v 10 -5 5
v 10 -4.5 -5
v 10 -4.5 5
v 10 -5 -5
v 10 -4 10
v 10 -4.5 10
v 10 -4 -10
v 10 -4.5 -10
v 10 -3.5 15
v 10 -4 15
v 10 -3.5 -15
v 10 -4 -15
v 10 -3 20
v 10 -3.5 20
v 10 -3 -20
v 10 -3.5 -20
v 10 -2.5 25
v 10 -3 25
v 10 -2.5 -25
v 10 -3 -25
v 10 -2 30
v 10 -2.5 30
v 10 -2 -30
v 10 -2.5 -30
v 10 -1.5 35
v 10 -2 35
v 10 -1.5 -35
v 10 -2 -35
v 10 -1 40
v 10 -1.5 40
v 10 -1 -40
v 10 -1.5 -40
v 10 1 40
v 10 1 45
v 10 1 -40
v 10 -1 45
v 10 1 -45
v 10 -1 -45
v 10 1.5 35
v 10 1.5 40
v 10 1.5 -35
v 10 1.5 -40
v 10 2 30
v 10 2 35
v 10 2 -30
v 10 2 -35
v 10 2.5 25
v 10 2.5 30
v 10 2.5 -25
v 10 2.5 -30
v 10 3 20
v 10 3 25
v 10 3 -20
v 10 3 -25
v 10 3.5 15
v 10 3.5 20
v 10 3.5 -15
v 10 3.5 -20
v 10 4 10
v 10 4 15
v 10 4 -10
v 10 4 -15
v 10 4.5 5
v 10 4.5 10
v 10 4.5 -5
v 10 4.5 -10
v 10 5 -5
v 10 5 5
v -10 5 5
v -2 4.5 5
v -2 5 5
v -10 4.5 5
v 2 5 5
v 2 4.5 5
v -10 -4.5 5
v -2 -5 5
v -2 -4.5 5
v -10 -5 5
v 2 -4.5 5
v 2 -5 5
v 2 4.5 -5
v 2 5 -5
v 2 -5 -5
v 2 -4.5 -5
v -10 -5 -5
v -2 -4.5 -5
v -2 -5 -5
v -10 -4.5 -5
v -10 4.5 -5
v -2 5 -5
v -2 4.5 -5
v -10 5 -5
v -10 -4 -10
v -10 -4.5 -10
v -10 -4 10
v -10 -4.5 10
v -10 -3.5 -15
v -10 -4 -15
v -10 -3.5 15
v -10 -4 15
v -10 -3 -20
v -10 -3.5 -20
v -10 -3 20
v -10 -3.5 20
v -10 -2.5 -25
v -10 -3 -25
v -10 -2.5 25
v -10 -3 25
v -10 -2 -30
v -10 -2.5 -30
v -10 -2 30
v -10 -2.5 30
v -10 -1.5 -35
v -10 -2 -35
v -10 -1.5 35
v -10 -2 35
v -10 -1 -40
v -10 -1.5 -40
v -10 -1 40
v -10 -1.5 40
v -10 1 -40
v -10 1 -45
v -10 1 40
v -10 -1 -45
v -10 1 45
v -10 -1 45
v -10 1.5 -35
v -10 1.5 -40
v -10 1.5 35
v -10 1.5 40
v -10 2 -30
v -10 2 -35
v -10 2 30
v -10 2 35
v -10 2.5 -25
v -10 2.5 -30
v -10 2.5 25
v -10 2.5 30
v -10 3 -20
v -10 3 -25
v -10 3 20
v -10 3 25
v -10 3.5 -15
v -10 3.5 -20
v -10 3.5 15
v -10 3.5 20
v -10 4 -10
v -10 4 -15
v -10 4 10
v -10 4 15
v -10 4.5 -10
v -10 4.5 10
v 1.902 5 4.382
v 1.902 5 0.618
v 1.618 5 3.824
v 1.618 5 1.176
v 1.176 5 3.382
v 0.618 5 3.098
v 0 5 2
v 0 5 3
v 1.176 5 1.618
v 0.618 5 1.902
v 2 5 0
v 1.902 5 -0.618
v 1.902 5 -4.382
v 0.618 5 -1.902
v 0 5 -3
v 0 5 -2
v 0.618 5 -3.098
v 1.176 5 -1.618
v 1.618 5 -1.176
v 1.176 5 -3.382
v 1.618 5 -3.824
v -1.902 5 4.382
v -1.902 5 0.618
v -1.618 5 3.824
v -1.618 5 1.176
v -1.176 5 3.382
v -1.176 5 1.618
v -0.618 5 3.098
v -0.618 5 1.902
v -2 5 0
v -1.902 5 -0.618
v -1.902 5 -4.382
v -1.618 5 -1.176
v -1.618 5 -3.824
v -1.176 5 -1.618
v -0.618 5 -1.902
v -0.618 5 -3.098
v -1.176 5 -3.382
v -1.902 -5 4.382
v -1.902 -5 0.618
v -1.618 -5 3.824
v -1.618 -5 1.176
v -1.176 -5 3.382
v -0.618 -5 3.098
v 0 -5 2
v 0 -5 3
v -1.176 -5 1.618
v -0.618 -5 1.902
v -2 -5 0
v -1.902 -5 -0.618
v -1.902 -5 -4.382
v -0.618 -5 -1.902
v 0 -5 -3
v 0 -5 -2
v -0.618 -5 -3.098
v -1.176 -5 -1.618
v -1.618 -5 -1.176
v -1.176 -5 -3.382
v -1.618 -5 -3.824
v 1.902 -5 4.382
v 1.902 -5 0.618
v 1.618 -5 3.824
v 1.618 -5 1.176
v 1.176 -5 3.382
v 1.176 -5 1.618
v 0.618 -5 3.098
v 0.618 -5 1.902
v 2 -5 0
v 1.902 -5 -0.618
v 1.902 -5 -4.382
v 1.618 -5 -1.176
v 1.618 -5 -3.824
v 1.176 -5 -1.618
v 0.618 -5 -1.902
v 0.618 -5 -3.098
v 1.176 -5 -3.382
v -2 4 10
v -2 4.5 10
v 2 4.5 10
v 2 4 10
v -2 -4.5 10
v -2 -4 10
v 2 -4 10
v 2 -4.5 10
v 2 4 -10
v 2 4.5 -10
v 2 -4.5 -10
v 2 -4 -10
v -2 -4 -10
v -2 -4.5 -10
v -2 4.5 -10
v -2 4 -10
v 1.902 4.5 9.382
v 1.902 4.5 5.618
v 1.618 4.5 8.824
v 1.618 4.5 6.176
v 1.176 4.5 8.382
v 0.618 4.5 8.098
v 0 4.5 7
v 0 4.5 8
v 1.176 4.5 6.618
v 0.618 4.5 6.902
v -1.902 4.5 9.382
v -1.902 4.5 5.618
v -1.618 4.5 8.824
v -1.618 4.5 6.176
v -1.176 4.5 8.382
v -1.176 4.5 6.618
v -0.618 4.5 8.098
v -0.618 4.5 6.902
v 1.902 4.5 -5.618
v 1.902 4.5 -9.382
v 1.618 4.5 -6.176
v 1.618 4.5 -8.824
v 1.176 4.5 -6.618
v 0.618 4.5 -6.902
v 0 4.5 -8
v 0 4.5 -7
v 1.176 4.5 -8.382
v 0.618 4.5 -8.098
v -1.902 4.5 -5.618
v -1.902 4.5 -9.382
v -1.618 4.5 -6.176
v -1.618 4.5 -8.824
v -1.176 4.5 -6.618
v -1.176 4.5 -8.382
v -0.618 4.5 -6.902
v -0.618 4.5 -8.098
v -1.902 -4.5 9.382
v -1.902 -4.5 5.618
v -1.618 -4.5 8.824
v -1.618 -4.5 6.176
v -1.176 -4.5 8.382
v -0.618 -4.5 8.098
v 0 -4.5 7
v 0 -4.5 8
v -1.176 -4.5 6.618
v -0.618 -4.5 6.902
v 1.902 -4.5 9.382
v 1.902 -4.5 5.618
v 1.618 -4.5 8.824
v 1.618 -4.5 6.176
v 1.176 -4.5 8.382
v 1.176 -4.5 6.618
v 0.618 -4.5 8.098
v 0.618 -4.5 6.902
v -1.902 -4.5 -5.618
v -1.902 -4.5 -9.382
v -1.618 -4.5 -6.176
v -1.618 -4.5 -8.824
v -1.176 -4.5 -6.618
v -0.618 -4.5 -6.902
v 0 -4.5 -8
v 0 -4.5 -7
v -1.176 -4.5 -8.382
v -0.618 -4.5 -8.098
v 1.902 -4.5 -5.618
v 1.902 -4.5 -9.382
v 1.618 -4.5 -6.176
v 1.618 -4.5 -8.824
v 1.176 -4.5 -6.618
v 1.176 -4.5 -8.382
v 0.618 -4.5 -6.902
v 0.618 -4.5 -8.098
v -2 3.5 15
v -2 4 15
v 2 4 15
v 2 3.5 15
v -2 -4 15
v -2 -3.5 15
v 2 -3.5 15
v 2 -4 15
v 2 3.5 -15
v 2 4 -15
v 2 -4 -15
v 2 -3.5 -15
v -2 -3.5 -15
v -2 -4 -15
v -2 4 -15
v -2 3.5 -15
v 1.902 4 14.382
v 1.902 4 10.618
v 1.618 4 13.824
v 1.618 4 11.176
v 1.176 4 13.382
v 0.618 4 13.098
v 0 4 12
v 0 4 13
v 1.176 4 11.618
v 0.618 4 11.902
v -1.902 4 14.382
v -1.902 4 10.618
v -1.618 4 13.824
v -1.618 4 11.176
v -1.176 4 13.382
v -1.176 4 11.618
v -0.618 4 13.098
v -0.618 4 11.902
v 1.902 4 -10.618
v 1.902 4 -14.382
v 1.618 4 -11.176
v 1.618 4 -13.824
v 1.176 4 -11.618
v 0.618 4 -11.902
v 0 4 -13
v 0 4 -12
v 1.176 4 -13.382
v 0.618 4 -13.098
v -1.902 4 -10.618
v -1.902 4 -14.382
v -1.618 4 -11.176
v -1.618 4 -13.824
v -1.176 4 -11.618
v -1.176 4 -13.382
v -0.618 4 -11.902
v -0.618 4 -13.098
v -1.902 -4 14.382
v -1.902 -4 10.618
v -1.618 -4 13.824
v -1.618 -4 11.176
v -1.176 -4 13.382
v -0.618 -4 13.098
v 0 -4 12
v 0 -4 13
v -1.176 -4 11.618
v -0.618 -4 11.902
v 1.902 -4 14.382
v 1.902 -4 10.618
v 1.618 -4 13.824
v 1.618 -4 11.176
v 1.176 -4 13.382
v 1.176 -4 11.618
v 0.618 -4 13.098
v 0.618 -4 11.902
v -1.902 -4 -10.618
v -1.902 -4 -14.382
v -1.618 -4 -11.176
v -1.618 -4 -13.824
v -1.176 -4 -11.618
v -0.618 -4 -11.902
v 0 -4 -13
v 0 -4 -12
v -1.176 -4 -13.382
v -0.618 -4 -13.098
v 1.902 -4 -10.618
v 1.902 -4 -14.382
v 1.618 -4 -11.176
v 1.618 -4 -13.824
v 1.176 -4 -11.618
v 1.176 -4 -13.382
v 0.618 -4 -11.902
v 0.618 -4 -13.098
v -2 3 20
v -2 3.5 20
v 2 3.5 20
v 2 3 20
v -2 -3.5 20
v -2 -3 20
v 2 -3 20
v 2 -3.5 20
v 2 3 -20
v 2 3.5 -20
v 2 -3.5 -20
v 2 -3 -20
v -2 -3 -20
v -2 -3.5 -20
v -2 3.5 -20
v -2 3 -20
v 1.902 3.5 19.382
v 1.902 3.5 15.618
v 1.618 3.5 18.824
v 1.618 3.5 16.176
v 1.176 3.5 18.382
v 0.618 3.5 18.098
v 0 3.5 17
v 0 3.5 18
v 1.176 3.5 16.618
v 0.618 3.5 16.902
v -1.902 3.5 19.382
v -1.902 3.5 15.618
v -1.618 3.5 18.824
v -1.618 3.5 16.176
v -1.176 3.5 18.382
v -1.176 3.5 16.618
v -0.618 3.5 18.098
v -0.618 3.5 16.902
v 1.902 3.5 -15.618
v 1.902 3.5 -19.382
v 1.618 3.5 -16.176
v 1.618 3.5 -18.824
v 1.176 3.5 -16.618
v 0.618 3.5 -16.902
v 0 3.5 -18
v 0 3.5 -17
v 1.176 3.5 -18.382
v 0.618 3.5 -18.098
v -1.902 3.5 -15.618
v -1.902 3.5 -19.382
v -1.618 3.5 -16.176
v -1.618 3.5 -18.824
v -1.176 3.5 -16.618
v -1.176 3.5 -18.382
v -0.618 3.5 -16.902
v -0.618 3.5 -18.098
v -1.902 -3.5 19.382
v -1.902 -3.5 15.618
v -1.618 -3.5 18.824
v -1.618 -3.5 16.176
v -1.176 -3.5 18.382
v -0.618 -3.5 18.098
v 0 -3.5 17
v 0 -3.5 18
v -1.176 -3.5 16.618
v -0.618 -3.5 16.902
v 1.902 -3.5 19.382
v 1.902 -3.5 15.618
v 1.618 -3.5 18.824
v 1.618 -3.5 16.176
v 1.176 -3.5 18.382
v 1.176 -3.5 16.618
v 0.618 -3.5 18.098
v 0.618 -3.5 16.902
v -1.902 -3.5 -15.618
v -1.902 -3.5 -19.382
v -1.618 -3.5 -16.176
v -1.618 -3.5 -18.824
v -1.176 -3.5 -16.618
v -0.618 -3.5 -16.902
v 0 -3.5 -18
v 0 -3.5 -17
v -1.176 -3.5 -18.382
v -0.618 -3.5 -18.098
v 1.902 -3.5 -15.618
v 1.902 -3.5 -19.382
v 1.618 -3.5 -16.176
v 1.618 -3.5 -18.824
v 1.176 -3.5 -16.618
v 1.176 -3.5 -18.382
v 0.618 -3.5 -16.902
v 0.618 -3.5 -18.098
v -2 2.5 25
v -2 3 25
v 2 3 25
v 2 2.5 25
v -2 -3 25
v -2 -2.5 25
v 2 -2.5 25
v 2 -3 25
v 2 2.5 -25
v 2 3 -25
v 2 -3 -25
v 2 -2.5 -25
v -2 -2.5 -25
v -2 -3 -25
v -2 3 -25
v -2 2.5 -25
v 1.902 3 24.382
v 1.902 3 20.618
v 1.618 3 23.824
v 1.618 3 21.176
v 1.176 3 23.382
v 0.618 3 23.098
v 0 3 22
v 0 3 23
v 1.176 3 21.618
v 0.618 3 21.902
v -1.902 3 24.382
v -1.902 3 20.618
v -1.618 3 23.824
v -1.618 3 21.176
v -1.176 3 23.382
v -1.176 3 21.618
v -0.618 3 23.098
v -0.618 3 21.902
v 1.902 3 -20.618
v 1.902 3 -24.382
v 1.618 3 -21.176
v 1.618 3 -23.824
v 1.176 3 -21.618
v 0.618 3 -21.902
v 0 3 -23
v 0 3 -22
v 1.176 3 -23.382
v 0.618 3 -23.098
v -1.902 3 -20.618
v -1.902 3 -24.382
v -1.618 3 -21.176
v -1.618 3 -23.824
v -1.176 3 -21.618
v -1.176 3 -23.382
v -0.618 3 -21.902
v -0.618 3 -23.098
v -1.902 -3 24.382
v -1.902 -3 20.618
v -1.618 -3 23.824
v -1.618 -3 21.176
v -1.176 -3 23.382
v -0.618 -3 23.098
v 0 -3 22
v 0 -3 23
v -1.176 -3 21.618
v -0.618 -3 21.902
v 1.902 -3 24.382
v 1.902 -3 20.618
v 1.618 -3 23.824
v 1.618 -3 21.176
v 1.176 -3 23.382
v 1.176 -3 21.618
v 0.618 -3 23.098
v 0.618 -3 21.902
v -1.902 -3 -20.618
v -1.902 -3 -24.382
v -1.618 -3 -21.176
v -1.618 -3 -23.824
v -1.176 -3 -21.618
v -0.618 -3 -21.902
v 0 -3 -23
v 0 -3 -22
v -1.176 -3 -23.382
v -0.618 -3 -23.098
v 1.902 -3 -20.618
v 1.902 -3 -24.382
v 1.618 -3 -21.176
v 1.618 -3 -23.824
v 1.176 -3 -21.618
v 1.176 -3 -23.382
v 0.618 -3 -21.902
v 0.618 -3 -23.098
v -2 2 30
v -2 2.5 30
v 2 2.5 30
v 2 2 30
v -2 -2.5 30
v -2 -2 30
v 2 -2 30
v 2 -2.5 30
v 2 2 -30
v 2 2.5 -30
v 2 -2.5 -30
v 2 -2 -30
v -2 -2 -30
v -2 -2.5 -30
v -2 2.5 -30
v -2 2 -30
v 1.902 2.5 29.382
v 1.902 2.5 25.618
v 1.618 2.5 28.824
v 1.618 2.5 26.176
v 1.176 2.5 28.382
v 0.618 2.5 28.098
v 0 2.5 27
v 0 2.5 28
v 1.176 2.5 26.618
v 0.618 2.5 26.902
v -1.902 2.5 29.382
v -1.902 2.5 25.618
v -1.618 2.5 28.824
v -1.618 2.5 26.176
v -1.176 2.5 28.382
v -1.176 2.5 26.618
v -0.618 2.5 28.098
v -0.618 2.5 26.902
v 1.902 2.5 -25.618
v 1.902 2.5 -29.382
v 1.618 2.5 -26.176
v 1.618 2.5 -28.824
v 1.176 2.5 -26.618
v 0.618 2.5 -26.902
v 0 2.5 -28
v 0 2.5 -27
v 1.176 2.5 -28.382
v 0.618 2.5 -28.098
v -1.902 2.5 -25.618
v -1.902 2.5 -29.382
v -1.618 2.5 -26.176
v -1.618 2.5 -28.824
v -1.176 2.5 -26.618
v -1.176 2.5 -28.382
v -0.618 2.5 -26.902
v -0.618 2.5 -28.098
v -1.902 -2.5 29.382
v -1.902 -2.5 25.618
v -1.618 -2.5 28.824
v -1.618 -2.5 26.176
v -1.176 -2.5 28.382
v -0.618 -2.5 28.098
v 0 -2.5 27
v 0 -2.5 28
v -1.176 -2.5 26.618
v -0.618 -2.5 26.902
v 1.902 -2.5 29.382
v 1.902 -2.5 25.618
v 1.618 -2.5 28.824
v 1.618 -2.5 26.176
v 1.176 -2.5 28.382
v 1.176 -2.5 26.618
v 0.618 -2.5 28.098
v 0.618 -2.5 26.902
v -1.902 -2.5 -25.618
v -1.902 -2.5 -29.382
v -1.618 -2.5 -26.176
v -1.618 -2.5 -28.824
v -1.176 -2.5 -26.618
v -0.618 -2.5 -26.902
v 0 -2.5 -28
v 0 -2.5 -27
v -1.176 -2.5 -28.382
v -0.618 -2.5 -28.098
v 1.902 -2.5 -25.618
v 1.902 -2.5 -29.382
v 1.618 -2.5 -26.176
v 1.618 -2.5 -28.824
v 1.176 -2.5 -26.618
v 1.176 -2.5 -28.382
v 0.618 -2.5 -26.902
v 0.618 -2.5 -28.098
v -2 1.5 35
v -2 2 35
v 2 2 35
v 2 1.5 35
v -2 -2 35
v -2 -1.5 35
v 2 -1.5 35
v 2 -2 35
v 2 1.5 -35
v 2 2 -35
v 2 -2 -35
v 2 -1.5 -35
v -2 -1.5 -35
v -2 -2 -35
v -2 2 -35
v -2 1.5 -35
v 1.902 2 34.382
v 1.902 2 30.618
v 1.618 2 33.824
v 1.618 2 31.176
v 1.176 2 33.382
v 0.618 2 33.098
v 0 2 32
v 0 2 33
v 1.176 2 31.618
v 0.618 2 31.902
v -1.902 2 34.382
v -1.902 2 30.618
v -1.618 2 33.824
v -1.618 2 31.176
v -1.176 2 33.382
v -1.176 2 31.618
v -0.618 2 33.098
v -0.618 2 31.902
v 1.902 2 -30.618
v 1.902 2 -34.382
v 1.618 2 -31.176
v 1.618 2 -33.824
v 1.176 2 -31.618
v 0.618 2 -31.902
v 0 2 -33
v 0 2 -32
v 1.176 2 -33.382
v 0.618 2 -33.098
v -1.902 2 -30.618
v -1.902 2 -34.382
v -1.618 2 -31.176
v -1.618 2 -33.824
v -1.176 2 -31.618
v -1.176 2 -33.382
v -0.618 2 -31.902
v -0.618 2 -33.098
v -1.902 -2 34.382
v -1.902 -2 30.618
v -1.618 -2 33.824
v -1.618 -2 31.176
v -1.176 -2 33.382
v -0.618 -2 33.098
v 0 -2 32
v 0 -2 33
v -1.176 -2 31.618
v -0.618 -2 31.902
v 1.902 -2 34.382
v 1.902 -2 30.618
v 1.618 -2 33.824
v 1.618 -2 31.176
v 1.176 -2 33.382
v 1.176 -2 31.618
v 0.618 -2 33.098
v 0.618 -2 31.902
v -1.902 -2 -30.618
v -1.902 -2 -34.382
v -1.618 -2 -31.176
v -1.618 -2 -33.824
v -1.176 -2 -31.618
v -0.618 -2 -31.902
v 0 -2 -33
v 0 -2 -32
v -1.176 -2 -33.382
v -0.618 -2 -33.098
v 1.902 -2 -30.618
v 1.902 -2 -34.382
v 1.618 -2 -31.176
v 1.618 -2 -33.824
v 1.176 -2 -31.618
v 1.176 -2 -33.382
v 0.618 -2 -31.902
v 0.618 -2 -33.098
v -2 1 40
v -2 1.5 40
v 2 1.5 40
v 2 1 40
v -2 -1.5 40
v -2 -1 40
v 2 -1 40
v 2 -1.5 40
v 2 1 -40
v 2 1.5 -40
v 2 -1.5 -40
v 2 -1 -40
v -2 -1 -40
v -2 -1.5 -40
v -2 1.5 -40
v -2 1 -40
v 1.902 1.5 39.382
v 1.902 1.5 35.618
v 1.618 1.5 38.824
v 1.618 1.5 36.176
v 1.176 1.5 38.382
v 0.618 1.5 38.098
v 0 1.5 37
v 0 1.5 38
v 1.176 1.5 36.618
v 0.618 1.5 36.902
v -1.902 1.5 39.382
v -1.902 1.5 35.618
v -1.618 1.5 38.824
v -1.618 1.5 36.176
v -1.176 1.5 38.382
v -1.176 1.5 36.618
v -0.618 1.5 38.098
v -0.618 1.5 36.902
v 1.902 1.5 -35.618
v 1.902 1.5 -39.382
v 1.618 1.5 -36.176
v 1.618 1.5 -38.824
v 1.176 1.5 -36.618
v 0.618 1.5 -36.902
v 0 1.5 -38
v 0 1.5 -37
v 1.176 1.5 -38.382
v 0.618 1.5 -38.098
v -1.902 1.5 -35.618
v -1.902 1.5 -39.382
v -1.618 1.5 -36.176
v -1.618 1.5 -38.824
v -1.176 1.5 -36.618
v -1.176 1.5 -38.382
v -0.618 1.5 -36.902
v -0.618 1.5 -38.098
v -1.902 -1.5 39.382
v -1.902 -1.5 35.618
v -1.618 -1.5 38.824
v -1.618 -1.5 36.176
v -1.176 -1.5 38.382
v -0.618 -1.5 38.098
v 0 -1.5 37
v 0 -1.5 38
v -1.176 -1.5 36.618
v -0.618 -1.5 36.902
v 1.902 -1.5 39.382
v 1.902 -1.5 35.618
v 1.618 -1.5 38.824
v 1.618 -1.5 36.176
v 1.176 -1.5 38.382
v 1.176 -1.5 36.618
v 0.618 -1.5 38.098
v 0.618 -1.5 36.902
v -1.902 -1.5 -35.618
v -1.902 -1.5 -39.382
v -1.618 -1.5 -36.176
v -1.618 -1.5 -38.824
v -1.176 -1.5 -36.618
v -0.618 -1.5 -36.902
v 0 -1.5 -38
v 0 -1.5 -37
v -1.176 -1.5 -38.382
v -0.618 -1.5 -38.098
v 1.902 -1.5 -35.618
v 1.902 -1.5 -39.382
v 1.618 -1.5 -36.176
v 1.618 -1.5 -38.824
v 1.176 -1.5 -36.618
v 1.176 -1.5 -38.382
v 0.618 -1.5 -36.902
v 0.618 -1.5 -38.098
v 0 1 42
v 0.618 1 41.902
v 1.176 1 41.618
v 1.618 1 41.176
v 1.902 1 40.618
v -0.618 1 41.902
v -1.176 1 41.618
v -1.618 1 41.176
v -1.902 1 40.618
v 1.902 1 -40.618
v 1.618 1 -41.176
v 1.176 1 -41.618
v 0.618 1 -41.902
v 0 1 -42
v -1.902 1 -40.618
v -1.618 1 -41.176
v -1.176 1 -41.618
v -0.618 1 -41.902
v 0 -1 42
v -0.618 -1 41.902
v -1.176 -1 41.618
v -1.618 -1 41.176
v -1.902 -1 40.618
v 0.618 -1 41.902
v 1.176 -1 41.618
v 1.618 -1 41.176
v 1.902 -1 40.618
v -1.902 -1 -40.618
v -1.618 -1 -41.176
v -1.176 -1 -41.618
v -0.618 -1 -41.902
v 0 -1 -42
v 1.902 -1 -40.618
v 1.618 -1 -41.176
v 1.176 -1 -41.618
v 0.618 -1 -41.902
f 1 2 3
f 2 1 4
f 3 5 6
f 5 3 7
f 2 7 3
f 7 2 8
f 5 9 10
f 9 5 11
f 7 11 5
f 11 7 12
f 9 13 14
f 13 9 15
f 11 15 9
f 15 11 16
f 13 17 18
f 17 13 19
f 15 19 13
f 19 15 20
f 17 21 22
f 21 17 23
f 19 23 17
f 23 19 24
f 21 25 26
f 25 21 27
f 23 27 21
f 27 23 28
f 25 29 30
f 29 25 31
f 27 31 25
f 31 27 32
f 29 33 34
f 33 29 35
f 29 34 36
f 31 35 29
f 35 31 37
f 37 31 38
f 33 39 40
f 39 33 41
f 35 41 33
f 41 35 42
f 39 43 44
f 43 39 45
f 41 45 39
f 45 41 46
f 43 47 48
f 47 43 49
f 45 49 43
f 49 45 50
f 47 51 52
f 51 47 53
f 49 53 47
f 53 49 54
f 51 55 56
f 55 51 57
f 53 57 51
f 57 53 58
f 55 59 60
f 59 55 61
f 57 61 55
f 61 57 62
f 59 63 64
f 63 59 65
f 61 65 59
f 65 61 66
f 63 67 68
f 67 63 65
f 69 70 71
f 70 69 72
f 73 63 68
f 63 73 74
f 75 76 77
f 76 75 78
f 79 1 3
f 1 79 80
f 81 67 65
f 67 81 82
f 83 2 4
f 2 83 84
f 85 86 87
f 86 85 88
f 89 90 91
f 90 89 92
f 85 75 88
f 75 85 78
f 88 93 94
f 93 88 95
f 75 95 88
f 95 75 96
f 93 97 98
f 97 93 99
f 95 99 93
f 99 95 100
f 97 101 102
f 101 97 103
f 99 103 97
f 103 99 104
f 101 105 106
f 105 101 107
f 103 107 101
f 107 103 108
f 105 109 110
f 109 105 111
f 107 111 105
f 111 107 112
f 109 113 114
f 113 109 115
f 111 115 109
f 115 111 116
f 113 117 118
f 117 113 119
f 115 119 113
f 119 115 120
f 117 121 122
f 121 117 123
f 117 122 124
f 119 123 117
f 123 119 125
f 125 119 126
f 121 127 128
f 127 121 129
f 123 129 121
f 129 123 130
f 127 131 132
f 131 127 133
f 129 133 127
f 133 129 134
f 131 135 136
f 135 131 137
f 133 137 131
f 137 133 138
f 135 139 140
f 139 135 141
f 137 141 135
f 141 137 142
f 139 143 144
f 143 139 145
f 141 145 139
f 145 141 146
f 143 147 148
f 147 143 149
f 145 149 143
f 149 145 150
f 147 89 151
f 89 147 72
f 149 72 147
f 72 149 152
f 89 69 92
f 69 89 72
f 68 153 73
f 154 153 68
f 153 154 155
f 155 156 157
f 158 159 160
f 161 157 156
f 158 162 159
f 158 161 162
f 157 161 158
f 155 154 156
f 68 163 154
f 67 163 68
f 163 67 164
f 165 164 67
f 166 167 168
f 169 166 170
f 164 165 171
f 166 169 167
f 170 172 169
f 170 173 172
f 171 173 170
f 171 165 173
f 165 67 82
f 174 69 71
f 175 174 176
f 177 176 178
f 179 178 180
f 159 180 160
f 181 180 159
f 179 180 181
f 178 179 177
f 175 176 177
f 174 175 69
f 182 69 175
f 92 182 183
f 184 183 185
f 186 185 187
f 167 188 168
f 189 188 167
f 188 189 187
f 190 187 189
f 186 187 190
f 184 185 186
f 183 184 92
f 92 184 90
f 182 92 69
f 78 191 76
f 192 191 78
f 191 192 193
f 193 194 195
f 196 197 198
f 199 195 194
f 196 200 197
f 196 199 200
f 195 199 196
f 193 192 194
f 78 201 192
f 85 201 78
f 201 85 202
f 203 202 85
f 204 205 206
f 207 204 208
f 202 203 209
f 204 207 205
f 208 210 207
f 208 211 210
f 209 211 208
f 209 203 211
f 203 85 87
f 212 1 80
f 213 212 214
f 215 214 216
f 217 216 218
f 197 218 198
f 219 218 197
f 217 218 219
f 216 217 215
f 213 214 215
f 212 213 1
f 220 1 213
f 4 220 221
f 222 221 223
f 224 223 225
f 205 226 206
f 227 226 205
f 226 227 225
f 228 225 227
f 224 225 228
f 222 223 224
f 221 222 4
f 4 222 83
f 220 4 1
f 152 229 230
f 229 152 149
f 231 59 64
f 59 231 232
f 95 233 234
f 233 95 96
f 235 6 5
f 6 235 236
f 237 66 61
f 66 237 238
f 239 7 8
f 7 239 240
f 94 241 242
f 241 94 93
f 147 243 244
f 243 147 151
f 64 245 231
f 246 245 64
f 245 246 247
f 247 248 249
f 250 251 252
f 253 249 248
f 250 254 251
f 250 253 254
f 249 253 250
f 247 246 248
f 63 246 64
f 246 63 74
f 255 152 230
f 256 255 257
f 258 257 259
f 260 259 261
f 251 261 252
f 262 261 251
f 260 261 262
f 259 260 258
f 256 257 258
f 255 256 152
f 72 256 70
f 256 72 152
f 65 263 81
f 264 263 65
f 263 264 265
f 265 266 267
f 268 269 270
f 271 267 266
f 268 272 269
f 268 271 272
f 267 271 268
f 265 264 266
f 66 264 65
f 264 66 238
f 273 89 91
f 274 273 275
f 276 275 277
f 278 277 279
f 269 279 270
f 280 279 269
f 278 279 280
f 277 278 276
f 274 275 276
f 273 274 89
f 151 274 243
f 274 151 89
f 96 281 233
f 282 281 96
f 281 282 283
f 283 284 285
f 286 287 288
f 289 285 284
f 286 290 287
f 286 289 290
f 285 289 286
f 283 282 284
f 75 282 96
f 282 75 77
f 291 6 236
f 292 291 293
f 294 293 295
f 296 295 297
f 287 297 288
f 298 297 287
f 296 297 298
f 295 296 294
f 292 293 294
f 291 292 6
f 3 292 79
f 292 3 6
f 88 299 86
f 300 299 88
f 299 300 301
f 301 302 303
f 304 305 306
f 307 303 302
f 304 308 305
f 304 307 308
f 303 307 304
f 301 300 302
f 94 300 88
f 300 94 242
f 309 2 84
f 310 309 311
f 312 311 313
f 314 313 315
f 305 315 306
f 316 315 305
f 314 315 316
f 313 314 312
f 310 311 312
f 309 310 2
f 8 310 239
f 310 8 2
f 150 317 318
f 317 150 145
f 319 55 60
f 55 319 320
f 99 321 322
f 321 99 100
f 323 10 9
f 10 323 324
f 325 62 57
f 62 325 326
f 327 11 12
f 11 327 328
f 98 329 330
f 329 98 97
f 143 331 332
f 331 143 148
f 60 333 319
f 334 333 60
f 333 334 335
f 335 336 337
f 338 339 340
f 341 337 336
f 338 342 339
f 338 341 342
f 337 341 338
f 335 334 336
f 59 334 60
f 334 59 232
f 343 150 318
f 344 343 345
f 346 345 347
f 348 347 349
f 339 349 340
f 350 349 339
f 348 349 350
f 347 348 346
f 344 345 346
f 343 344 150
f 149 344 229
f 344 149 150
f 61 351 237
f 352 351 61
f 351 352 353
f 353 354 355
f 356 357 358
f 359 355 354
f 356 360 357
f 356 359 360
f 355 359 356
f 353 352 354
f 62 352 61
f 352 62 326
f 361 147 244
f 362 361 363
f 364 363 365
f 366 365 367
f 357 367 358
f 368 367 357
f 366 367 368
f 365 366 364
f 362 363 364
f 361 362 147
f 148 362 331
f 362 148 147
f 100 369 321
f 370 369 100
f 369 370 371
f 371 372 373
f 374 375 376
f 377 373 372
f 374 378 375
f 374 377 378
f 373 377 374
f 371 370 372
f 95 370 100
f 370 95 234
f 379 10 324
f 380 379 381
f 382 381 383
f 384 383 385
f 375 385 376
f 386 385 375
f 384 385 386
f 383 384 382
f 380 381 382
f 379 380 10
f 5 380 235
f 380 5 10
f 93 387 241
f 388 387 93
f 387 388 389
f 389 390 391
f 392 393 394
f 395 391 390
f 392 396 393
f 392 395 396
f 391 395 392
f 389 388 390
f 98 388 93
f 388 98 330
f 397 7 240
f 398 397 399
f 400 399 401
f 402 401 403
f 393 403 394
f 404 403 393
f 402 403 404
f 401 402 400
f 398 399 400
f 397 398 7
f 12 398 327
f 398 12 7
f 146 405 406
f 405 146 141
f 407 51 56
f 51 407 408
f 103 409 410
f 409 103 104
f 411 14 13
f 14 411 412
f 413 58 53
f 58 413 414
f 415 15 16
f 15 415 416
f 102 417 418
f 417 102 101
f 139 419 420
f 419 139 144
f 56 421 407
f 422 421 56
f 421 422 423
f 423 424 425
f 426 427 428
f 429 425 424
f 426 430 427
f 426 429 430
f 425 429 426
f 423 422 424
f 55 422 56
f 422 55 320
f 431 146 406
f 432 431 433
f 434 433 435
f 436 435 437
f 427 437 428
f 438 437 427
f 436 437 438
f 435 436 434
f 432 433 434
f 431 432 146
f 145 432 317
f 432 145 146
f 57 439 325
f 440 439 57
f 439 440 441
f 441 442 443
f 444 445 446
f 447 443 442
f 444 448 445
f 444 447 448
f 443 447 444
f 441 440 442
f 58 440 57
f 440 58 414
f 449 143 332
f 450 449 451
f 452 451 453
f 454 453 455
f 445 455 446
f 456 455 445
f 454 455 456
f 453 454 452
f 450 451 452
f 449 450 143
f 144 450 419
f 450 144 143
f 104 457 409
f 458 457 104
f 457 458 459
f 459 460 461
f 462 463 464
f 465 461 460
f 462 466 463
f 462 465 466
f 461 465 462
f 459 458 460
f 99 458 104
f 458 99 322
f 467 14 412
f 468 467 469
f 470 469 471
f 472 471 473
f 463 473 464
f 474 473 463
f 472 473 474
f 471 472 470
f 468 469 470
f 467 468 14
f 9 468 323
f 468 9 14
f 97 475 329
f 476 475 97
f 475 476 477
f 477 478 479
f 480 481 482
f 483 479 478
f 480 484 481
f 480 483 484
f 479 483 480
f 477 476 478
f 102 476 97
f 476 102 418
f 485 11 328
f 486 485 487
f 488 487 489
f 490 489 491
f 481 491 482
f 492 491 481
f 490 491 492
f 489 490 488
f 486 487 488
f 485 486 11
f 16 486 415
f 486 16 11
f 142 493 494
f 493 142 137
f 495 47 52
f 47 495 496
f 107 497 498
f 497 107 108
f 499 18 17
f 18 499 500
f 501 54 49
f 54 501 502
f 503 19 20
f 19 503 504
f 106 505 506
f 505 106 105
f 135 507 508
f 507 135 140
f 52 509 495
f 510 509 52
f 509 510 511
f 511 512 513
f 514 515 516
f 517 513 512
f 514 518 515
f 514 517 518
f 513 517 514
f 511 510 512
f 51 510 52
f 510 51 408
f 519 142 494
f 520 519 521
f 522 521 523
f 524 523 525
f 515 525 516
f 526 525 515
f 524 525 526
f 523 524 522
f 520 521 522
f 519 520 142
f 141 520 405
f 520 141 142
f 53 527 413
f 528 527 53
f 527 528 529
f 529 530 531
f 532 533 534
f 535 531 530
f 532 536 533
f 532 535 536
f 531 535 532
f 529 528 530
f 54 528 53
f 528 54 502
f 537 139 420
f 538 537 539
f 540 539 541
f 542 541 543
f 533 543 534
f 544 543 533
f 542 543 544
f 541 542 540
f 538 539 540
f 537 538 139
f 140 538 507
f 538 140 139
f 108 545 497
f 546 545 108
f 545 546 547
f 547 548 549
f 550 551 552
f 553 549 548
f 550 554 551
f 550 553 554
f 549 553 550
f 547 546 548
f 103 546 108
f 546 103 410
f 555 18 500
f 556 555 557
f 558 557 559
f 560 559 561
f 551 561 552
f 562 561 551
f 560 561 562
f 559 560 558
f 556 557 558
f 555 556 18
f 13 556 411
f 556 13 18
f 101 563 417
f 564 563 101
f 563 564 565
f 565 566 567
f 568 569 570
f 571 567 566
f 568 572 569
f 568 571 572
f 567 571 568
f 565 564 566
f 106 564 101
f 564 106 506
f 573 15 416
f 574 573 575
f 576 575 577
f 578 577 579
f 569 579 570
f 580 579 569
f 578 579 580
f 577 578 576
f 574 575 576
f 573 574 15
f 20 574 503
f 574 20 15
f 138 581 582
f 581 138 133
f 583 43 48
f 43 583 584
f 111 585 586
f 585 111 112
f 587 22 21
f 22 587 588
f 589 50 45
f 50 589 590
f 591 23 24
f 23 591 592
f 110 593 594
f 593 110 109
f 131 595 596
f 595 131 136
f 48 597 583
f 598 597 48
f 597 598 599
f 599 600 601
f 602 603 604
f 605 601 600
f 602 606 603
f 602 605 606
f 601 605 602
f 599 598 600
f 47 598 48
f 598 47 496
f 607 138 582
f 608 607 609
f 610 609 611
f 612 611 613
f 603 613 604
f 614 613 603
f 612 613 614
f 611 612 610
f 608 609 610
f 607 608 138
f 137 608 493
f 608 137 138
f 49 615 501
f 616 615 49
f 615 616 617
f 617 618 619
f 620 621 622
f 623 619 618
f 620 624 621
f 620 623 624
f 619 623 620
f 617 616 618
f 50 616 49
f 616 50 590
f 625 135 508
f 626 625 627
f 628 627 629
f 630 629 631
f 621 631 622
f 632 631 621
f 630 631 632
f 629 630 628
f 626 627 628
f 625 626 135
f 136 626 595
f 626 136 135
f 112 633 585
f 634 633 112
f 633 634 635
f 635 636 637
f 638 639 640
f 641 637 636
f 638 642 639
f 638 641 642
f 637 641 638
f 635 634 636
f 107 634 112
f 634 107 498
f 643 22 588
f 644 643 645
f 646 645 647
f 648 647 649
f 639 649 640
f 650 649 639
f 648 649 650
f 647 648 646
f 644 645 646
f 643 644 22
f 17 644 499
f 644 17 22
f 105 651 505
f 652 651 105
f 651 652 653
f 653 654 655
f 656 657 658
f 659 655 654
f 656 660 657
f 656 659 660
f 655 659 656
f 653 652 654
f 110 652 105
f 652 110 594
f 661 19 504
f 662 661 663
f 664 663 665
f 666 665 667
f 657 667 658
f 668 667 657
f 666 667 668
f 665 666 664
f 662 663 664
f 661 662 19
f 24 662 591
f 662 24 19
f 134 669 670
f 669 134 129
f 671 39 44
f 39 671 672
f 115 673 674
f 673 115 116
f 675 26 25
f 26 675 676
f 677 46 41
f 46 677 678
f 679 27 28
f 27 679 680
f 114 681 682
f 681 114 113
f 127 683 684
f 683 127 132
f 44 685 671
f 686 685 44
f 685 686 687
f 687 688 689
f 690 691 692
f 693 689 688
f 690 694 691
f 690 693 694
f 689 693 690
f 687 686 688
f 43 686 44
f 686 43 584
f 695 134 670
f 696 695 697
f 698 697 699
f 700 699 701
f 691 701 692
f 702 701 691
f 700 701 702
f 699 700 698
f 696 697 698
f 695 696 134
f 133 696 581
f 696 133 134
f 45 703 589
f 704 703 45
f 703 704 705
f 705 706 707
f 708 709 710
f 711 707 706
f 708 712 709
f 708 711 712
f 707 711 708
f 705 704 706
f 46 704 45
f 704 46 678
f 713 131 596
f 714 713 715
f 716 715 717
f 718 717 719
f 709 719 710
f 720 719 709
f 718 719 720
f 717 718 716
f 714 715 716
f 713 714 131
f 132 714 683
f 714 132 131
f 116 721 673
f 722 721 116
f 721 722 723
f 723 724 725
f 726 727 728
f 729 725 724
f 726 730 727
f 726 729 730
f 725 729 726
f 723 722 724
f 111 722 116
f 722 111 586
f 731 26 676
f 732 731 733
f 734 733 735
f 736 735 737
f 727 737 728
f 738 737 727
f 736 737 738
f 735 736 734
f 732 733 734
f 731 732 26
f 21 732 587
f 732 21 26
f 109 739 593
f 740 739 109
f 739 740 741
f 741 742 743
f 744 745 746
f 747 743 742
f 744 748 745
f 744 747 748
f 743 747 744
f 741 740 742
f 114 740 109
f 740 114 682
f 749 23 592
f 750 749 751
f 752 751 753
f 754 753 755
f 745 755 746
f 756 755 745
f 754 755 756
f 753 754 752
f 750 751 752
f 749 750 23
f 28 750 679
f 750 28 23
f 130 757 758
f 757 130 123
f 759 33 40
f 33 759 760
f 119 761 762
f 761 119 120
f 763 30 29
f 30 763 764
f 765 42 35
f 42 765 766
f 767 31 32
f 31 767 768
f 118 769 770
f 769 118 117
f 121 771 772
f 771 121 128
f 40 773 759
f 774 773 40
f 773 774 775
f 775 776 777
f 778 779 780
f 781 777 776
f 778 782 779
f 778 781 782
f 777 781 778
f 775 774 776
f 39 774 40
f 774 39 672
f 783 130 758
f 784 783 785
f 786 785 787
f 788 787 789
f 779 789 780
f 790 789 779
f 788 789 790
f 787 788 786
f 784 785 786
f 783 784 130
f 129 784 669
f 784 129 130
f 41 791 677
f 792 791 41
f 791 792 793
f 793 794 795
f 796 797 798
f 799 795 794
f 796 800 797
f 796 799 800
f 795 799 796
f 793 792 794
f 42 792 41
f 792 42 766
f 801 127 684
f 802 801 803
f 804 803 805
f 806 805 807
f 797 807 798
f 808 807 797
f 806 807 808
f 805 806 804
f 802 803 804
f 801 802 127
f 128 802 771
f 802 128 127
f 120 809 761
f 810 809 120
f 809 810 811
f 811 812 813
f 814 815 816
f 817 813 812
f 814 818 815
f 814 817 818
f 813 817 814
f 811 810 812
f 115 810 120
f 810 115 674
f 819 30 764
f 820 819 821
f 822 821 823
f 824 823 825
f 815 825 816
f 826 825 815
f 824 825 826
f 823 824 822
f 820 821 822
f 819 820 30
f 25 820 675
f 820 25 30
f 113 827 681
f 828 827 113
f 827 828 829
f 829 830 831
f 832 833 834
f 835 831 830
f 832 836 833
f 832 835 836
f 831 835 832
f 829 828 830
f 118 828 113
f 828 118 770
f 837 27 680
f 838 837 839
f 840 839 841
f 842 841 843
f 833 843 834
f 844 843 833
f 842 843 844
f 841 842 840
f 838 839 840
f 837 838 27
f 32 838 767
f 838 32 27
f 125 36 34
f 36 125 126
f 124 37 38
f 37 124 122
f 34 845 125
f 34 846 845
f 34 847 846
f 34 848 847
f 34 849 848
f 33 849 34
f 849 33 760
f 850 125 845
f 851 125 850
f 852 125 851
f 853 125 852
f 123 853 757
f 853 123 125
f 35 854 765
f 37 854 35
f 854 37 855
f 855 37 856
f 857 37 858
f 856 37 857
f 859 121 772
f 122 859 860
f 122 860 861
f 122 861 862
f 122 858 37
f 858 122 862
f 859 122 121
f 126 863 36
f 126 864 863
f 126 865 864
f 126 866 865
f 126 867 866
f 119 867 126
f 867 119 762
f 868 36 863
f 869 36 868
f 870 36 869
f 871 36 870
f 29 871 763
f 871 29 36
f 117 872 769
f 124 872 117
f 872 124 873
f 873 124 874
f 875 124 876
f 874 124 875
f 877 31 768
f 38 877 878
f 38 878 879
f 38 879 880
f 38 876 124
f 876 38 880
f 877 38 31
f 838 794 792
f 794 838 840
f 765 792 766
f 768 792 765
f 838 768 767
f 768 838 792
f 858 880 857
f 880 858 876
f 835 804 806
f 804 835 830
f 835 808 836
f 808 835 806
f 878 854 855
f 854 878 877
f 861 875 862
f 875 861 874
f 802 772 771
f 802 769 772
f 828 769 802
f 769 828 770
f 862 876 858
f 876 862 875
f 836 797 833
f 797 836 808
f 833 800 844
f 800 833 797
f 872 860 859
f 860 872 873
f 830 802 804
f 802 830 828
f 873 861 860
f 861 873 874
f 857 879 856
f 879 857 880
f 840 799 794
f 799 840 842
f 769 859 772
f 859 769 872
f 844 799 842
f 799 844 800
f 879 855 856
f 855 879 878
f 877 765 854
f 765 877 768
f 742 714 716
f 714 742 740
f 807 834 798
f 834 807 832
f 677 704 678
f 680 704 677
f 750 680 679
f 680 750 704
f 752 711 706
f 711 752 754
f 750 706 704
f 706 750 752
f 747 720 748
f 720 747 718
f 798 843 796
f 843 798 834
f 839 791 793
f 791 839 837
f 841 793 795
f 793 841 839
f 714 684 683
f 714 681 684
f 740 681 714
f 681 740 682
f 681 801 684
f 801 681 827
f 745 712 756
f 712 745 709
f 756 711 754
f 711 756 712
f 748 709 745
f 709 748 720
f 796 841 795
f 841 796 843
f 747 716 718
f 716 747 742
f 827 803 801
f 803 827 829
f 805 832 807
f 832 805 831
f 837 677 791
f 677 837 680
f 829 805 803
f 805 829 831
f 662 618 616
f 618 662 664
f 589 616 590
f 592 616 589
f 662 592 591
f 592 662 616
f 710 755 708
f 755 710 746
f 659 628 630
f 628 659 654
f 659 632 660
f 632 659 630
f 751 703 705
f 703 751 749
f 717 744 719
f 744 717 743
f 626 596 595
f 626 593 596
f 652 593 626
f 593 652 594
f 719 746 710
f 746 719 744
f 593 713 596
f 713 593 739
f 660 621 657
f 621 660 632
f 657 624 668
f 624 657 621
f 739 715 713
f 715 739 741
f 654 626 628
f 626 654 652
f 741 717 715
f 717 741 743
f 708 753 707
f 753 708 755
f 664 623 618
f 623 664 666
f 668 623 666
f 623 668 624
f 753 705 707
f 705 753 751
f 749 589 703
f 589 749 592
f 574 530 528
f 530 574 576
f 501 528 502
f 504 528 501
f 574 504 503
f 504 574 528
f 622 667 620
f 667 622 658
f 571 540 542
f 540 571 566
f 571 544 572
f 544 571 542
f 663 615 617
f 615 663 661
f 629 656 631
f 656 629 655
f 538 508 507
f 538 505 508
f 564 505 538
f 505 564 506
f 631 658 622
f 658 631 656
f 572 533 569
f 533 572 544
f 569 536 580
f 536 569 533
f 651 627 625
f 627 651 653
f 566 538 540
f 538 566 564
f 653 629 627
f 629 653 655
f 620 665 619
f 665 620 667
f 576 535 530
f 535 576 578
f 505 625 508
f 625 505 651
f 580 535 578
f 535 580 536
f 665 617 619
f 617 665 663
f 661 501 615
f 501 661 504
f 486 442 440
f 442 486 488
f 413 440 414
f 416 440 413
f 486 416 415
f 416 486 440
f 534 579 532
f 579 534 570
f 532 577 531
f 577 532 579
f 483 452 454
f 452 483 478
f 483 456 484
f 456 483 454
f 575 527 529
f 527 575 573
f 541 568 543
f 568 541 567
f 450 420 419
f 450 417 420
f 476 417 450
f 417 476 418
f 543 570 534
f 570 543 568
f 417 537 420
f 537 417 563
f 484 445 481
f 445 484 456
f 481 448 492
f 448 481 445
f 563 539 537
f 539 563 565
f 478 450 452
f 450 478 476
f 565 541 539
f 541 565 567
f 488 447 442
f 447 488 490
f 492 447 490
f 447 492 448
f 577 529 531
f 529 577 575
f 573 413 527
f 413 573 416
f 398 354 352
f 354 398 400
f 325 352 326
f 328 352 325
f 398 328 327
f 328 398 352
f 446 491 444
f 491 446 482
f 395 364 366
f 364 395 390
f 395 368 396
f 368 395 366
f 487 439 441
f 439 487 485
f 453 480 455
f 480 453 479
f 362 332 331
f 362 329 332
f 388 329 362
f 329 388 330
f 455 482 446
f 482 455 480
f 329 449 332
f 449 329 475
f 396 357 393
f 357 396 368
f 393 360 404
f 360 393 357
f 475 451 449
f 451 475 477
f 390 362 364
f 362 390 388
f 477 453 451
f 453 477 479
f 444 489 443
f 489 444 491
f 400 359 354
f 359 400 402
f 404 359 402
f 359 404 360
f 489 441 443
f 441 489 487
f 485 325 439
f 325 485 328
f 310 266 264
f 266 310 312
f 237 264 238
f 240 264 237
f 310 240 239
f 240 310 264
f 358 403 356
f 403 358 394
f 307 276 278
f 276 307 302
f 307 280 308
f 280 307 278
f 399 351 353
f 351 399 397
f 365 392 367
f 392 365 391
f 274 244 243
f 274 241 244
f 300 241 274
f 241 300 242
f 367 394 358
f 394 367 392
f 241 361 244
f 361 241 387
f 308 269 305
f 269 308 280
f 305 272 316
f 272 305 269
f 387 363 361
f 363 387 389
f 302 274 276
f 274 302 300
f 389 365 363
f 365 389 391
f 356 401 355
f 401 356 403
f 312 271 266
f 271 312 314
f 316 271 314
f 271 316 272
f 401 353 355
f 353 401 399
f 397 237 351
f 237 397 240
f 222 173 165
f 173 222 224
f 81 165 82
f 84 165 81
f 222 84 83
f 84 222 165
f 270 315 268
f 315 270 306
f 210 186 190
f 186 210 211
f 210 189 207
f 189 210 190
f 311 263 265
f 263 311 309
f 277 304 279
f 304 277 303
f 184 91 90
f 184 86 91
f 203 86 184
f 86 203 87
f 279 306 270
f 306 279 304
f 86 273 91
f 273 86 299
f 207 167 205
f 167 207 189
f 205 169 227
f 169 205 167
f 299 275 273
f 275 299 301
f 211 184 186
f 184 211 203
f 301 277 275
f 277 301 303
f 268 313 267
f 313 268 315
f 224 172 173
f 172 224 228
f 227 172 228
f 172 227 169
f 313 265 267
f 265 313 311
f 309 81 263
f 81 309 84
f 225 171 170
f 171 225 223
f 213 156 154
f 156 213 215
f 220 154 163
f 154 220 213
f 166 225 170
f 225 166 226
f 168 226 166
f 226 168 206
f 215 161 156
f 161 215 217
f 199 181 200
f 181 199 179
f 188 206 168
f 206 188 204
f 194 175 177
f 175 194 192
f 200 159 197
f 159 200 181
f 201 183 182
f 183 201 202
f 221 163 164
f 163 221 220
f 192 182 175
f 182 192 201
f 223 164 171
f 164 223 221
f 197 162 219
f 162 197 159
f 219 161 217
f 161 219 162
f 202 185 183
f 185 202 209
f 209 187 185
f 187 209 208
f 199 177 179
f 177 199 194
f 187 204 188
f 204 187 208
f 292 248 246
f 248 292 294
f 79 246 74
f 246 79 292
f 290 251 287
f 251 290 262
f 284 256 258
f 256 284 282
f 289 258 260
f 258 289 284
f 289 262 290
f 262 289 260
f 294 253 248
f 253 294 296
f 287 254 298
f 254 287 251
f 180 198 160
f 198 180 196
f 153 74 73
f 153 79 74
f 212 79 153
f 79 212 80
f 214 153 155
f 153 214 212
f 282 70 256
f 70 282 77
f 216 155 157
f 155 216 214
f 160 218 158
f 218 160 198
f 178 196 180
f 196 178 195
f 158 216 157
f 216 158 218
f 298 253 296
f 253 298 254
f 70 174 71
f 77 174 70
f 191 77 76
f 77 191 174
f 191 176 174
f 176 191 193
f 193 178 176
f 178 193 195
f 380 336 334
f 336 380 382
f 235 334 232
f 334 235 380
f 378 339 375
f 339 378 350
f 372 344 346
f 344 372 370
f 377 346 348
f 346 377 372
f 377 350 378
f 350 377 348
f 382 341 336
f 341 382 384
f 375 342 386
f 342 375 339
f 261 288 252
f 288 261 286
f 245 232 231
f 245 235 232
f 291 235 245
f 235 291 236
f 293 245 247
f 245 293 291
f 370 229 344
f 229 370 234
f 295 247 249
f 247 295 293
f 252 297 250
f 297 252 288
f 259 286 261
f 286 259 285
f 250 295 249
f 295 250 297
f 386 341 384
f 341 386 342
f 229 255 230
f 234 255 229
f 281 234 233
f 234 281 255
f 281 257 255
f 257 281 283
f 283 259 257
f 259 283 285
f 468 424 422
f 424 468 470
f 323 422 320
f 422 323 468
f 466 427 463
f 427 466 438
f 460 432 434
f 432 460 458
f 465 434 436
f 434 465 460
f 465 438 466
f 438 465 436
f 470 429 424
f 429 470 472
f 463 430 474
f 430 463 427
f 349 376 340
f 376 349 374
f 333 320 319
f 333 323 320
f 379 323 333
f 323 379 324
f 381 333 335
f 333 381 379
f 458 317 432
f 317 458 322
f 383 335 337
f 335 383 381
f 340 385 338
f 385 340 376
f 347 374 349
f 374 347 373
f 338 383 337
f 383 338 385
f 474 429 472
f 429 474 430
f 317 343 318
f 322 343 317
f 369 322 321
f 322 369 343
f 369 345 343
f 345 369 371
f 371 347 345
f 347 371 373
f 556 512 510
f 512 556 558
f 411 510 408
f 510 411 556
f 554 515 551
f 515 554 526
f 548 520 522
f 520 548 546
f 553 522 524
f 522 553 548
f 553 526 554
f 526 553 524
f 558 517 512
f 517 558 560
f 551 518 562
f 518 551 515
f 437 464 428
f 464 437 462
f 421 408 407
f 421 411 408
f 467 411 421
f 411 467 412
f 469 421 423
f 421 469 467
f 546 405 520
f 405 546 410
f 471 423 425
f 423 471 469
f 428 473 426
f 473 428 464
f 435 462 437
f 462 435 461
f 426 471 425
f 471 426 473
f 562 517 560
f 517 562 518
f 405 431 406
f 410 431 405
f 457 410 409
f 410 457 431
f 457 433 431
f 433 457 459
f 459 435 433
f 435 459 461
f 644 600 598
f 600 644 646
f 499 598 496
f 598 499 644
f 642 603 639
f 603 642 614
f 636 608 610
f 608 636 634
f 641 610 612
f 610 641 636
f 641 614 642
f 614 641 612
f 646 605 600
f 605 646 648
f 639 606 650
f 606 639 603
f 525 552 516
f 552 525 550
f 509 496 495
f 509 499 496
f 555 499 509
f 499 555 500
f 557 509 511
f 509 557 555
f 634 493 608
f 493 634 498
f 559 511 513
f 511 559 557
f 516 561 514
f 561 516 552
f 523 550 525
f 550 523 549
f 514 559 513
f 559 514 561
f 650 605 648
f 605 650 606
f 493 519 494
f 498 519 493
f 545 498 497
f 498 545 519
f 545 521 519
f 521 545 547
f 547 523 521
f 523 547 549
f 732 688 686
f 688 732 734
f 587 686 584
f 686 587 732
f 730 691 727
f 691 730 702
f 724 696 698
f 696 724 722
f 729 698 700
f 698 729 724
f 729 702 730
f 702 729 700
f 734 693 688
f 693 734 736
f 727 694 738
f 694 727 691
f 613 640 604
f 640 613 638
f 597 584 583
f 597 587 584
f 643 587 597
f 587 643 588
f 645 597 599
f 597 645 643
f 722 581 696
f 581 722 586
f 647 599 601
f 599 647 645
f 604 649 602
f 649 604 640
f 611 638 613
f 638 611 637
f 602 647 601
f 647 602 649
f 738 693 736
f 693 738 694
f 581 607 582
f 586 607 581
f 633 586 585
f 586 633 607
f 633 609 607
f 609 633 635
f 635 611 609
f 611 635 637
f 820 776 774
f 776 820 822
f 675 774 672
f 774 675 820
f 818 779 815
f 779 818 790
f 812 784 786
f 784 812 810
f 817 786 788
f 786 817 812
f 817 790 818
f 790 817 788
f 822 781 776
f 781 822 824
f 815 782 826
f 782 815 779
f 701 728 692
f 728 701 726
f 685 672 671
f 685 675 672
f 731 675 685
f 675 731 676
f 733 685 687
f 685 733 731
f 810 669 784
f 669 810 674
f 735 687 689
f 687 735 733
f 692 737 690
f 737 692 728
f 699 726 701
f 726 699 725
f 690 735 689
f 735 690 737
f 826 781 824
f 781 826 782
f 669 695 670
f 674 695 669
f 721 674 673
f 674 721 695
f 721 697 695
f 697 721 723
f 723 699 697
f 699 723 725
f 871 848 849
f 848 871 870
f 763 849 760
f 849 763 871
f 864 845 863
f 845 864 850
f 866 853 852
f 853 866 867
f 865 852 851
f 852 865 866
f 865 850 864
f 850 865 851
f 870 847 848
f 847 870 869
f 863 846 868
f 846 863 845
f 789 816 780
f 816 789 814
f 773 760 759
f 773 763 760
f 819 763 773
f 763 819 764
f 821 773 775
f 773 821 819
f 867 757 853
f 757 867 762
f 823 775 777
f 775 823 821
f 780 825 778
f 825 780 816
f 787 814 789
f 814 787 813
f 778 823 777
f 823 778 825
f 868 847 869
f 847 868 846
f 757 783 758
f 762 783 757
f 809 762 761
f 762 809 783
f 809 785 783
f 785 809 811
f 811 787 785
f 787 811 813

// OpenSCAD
module body() {
for (i=[0:8]) {
  cube(size=[20, 10-i, 10+10*i], center=true);
}
}

module holes() {
for (i=[0:16]) {
translate ([0,0,-40+5*i])
rotate([90, 0, 0]) {
cylinder(r=2, h=20, center=true,$fn=20);
}
}
}

difference() {
  body();
  holes();
}
